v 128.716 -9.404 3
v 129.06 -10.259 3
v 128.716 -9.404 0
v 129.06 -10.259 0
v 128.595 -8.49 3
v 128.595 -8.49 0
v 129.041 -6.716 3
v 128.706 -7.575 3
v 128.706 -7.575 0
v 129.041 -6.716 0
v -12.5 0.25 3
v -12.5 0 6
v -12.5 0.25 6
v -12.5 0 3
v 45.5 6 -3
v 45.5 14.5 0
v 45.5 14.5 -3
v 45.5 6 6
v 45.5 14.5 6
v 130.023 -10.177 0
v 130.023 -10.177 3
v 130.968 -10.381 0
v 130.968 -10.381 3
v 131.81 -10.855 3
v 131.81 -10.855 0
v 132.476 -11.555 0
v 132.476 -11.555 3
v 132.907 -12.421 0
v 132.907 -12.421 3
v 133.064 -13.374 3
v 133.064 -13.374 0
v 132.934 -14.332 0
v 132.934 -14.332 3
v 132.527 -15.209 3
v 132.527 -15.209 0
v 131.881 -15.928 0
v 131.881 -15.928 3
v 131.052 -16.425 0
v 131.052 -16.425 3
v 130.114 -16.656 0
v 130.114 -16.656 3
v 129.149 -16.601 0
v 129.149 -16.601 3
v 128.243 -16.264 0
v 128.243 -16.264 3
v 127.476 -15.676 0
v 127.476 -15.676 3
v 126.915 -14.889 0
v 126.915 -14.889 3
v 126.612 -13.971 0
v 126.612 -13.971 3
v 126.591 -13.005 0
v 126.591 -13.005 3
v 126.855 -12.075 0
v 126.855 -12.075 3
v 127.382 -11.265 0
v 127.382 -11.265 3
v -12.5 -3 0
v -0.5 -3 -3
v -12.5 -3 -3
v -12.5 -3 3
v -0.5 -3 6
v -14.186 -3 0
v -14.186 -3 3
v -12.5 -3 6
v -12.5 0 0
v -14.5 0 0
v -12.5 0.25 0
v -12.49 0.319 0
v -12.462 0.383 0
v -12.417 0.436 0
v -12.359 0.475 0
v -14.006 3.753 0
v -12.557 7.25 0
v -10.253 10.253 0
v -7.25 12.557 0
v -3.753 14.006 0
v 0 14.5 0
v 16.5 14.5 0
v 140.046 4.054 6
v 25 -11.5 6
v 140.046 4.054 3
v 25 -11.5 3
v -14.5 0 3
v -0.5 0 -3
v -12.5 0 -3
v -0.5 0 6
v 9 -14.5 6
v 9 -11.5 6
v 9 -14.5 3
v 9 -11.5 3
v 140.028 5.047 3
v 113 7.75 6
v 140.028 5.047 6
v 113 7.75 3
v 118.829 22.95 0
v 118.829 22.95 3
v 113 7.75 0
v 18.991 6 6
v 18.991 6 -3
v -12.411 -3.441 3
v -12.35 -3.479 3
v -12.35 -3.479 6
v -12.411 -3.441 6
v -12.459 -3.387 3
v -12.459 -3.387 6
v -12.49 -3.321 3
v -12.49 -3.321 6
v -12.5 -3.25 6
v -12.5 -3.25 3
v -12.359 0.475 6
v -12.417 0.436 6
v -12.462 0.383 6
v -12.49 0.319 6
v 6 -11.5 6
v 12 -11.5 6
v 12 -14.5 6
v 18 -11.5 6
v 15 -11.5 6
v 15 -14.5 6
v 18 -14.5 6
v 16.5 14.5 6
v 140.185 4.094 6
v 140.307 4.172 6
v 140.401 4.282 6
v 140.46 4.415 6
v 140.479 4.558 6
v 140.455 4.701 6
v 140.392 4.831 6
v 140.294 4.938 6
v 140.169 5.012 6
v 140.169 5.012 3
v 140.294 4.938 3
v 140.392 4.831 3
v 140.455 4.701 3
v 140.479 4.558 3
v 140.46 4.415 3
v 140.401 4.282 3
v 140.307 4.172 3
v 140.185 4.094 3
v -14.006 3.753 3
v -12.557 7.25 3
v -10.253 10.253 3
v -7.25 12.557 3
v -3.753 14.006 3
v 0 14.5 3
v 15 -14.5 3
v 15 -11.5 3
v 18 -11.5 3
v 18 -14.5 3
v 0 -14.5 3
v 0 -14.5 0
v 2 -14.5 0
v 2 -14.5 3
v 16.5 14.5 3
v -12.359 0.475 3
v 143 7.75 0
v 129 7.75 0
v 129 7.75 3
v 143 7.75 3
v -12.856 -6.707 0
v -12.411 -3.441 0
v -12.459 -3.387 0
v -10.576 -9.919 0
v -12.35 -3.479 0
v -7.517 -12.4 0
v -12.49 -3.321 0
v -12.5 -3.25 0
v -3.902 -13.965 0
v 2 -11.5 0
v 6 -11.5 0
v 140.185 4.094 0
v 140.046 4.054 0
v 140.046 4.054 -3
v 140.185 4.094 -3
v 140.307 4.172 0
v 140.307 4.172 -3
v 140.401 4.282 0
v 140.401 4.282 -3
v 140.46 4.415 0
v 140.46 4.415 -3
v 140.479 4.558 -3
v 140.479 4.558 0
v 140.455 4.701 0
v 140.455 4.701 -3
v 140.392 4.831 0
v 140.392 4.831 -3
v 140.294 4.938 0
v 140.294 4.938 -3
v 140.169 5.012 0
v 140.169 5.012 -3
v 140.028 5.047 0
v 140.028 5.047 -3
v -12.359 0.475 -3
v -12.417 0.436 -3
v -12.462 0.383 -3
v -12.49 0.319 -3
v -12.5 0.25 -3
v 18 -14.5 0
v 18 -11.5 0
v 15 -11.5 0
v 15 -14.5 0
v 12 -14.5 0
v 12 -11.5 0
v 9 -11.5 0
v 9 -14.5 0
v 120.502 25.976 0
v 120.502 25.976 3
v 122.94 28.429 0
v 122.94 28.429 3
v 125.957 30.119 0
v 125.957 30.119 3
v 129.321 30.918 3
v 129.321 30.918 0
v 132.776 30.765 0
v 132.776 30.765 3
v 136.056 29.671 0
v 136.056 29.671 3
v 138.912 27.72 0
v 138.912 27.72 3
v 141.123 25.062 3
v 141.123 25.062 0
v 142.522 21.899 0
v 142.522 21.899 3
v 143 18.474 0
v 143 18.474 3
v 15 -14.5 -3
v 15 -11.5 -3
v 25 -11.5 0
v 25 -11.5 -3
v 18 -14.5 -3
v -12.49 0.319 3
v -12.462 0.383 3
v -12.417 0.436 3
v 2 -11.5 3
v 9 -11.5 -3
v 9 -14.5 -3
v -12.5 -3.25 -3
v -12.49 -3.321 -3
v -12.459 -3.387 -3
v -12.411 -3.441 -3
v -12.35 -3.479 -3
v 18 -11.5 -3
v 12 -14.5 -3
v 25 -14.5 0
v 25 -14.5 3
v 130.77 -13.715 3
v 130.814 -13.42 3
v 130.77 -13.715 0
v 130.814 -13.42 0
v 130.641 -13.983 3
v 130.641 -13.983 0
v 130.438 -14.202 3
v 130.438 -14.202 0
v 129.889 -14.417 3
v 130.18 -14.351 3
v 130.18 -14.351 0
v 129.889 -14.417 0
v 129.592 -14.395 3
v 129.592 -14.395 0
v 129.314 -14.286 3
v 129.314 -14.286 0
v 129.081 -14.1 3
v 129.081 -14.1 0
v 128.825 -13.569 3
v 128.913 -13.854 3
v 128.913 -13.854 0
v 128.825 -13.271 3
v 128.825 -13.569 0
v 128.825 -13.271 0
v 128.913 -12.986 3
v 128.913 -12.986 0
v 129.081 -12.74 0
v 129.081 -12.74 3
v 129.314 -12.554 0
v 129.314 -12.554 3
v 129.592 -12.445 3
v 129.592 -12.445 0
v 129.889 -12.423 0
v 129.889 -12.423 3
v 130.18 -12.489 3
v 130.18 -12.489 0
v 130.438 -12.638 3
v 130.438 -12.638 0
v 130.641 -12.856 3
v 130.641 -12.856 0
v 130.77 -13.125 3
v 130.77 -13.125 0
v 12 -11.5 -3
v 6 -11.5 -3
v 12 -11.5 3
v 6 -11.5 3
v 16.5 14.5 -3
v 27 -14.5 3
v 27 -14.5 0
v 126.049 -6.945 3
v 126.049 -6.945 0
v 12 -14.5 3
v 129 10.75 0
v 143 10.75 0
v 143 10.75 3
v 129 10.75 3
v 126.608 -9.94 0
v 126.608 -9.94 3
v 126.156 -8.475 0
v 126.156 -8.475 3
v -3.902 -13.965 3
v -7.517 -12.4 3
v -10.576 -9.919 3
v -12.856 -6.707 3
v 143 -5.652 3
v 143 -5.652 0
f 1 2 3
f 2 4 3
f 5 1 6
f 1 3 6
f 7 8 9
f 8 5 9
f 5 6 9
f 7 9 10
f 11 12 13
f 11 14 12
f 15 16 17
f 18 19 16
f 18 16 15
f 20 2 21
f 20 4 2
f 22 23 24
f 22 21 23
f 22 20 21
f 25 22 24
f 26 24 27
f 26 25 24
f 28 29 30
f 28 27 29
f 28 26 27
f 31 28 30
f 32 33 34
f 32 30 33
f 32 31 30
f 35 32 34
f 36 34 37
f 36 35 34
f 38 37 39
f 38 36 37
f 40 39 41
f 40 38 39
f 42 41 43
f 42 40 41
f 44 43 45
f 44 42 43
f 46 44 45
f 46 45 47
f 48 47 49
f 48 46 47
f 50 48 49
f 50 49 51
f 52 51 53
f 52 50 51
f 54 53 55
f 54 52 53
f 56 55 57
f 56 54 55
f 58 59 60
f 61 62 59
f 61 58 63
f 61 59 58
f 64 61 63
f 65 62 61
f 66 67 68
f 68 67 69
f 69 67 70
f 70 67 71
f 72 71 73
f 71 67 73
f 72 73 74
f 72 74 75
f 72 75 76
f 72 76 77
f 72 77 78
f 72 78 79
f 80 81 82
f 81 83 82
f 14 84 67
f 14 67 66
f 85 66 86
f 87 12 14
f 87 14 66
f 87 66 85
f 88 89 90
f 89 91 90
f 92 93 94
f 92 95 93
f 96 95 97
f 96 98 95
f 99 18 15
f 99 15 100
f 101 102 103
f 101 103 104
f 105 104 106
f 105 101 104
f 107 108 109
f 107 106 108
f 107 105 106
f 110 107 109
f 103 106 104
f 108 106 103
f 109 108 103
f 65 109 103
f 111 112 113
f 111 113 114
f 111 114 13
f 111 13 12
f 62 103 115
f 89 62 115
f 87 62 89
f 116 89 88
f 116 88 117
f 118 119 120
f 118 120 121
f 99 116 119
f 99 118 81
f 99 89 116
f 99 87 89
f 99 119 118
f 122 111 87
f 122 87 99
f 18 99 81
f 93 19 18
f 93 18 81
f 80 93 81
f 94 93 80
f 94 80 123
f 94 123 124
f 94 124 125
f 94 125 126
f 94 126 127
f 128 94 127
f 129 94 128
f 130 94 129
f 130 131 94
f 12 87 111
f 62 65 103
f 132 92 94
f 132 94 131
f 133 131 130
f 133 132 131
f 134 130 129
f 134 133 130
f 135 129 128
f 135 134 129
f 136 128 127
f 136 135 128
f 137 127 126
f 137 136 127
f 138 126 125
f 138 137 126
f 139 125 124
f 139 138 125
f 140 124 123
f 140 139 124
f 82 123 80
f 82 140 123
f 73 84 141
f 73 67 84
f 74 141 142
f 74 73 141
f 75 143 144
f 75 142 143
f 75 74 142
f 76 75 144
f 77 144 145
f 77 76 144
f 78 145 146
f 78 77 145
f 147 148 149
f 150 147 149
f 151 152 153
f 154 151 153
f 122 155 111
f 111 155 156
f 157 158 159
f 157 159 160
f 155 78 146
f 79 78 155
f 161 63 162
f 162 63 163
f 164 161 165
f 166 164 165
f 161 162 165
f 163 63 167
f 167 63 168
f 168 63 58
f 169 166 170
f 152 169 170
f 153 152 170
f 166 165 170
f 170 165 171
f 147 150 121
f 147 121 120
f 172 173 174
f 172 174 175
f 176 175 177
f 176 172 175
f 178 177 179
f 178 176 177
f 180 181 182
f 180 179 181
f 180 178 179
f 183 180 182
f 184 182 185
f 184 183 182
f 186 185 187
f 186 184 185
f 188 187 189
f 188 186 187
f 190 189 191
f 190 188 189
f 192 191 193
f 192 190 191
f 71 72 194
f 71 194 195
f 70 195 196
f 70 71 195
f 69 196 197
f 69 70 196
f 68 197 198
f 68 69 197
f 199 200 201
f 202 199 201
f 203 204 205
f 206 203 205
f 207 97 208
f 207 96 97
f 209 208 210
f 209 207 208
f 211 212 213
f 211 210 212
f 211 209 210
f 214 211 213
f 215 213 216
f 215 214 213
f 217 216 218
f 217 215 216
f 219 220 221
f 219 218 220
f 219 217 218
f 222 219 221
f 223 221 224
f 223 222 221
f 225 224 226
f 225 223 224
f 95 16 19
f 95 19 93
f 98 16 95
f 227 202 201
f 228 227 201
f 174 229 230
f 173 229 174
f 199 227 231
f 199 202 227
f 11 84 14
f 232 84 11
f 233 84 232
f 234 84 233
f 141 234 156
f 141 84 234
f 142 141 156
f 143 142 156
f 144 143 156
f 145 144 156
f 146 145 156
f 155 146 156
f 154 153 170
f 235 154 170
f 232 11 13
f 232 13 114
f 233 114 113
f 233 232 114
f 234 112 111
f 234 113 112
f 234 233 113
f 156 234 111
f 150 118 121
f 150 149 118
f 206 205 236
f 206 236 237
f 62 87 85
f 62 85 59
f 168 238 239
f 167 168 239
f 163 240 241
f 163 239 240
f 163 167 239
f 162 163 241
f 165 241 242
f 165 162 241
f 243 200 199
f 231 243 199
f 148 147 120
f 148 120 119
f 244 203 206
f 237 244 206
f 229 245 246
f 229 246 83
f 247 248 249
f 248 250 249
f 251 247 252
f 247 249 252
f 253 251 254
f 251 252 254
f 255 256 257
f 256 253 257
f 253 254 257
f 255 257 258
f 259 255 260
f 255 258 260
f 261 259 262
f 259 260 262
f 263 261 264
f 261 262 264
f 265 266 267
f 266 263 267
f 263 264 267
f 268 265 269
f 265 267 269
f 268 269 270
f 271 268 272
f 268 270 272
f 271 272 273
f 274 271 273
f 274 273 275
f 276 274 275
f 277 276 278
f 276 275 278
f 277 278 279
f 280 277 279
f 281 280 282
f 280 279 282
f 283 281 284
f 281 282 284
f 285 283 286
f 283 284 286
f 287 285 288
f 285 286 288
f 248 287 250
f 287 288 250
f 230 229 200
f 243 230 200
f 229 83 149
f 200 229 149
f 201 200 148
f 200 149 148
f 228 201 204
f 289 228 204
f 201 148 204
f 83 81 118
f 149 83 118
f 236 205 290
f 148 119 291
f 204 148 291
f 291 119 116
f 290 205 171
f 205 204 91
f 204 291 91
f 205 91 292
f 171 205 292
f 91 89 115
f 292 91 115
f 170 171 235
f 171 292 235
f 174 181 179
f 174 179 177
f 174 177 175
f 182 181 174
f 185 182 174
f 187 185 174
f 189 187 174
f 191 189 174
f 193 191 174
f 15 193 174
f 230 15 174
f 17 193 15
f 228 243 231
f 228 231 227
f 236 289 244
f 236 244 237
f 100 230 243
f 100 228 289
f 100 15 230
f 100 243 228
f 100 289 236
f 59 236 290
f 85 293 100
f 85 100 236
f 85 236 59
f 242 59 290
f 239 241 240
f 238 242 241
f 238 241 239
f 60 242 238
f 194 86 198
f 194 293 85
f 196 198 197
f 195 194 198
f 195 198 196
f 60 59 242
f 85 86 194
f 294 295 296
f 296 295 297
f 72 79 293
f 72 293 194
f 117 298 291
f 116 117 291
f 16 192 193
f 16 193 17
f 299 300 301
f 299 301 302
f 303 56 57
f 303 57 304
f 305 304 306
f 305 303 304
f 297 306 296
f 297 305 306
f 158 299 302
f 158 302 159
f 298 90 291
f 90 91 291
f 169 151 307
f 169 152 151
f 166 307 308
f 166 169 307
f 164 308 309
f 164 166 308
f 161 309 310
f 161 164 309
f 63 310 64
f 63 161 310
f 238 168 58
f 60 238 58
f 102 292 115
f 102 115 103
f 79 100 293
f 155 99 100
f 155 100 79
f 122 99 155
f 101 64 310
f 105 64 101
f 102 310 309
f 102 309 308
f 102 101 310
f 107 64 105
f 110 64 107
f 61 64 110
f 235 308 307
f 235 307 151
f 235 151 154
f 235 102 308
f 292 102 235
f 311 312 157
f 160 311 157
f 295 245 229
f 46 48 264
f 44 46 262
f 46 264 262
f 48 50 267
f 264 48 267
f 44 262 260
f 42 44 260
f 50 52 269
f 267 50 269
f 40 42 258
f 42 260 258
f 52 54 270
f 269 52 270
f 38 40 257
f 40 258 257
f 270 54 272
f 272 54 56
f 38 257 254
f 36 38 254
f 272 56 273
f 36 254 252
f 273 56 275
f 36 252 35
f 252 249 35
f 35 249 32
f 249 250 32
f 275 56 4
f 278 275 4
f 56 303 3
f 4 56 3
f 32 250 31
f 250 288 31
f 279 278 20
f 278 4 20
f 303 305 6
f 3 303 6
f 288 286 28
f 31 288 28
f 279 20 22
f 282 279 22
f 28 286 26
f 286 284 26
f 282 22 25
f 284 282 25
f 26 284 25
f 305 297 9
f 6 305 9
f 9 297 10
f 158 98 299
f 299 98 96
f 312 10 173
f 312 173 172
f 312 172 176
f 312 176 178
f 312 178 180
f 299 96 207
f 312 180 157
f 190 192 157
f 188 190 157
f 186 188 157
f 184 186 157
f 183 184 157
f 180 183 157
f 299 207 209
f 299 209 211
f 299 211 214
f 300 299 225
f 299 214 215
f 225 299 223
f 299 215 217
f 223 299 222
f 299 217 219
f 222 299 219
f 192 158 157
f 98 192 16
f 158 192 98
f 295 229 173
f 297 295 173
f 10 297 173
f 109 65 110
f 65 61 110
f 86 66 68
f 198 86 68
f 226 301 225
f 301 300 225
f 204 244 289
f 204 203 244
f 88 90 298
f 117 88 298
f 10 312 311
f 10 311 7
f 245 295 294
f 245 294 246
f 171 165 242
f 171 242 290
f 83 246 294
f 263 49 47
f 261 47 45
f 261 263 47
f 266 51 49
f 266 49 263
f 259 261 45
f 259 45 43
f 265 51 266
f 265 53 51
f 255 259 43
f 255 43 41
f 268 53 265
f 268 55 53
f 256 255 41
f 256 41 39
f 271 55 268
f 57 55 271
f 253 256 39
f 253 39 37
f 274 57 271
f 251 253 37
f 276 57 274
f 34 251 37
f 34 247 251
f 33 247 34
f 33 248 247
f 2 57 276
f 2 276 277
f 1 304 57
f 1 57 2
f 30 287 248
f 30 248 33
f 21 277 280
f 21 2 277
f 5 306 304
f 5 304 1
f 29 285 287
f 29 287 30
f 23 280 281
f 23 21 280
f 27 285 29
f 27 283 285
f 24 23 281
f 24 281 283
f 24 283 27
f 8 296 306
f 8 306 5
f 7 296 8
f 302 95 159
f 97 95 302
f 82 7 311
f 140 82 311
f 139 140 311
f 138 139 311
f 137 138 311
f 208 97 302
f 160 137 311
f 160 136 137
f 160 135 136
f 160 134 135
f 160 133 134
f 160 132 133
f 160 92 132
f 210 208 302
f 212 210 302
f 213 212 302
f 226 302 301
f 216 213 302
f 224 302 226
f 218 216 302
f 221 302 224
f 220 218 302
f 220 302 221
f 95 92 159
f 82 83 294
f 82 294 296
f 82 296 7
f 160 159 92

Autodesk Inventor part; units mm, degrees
ref_plane "YZ Plane" through (0, 0, 0) normal (1, 0, 0) x (0, 1, 0)
ref_plane "XZ Plane" through (0, 0, 0) normal (0, 1, 0) x (-1, 0, 0)
ref_plane "XY Plane" through (0, 0, 0) normal (0, 0, 1) x (1, 0, 0)
sketch "Esboço1" plane through (0, 0, 0) normal (0, 0, 1) x (1, 0, 0)
  line L0 (0, 0) -> (143, 0)
  line L1 (0, 14.5) -> (16.5, 14.5)
  line L2 (45.5, 14.5) -> (45.5, 6)
  line L3 (143, 0) -> (113, 0)
  line L4 (45.5, 14.5) -> (113, 7.75)
  arc A0 (143, 18.4741) -> (118.8287, 22.9497) centre (130.5, 18.4741) ccw
  line L5 (113, 7.75) -> (118.8287, 22.9497)
  line L6 (0, -14.5) -> (2, -14.5)
  line L7 (2, -14.5) -> (2, -11.5)
  line L8 (18.9914, 6) -> (45.5, 6)
  line L9 (16.5, 14.5) -> (18.9914, 6)
  line L10 (27, -14.5) -> (25, -14.5)
  line L11 (25, -14.5) -> (25, -11.5)
  line L12 (2, -11.5) -> (25, -11.5)
  line L13 (143, -5.6516) -> (129.0406, -6.7164)
  arc A1 (127.3817, -11.2647) -> (129.06, -10.2586) centre (129.8143, -13.4198) ccw
  circle A2 centre (129.8143, -13.4198) radius 1
  arc A3 (126.0492, -6.9446) -> (127.3817, -11.2647) centre (132.7451, -7.2449) ccw
  arc A4 (129.0406, -6.7164) -> (129.06, -10.2586) centre (132.2697, -8.4698) ccw
  line L14 (27, -14.5) -> (126.0492, -6.9446)
  line L15 (129.0406, -6.7164) -> (143, -5.6516)
  line L16 (-14.5, 0) -> (-0.5, 0)
  line L17 (-0.5, 0) -> (-0.5, -3)
  line L18 (-0.5, -3) -> (-14.1863, -3)
  arc A5 (0, 14.5) -> (-14.5, 0) centre (0, 0) ccw
  arc A6 (-14.1863, -3) -> (0, -14.5) centre (0, 0) ccw
  line L19 (113, 7.75) -> (124.9404, 6.556)
  line L20 (143, 10.75) -> (129, 10.75)
  line L21 (129, 10.75) -> (129, 7.75)
  line L22 (129, 7.75) -> (143, 7.75)
  line L23 (143, -5.6516) -> (143, 7.75)
  line L24 (143, 10.75) -> (143, 18.4741)
  dimension "d1" = 143
  dimension "d5" = 29
  dimension "d6" = 8.5
  dimension "d23" = 2
  dimension "d24" = 3
  dimension "d67" = 6.5
  dimension "d68" = 2
  dimension "d85" = 14
  dimension "d86" = 3
  dimension "d87" = 12
  dimension "d91" = 14
extrude "Extrusão1" add sketch "Esboço1" along normal blind 3
sketch "Esboço2" plane through (0, 0, 3) normal (0, 0, 1) x (1, 0, 0)
  line L0 (113, 7.75) -> (45.5, 14.5) projected
  line L1 (45.5, 14.5) -> (140.0285, 5.0471)
  arc A0 (140.0458, 4.0541) -> (140.0285, 5.0471) centre (139.9788, 4.5496) ccw
  line L2 (18.9914, 6) -> (16.5, 14.5) projected
  line L3 (25, -11.5) -> (140.0458, 4.0541)
  line L4 (45.5, 6) -> (18.9914, 6) projected
  line L5 (18.9914, 6) -> (45.5, 6)
  line L6 (45.5, 6) -> (45.5, 14.5)
  line L7 (9, -11.5) -> (9, -14.5)
  line L8 (9, -14.5) -> (12, -14.5)
  line L9 (12, -14.5) -> (12, -11.5)
  line L10 (6, -11.5) -> (9, -11.5)
  line L11 (18, -11.5) -> (18, -14.5)
  line L12 (18, -14.5) -> (15, -14.5)
  line L13 (15, -14.5) -> (15, -11.5)
  line L14 (12, -11.5) -> (15, -11.5)
  line L15 (18, -11.5) -> (25, -11.5)
  line L16 (-12.5, 0) -> (-12.5, 0.25)
  arc A1 (-12.3593, 0.4749) -> (-12.5, 0.25) centre (-12.25, 0.25) ccw
  line L17 (16.5, 14.5) -> (-12.3593, 0.4749)
  line L18 (-12.5, -3) -> (-12.5, -3.25)
  arc A2 (-12.5, -3.25) -> (-12.3501, -3.4791) centre (-12.25, -3.25) ccw
  line L19 (6, -11.5) -> (-12.3501, -3.4791)
  line L20 (-12.5, 0) -> (-0.5, 0)
  line L21 (-0.5, 0) -> (-0.5, -3)
  line L22 (-0.5, -3) -> (-12.5, -3)
  point P0 (0, 0)
  point P1 (113, 7.75)
  dimension "d22" = 95
  dimension "d45" = 3
  dimension "d46" = 3
  dimension "d48" = 3
  dimension "d49" = 3
  dimension "d60" = 3
  dimension "d82" = 12
extrude "Extrusão2" add sketch "Esboço2" along normal blind 3
sketch "Esboço3" plane through (0, 0, 0) normal (0, 0, -1) x (-1, 0, 0)
  arc A0 (-140.0285, 5.0471) -> (-140.0458, 4.0541) centre (-139.9788, 4.5496) ccw projected
  arc A1 (-140.0285, 5.0471) -> (-140.0458, 4.0541) centre (-139.9788, 4.5496) ccw
  line L0 (-25, -11.5) -> (-140.0458, 4.0541)
  line L1 (-45.5, 14.5) -> (-45.5, 6) projected
  line L2 (-45.5, 14.5) -> (-45.5, 6)
  line L3 (-45.5, 6) -> (-18.9914, 6)
  line L4 (-25, -11.5) -> (-18, -11.5)
  line L5 (-18.9914, 6) -> (-16.5, 14.5)
  arc A2 (12.5, 0.25) -> (12.3593, 0.4749) centre (12.25, 0.25) ccw projected
  arc A3 (12.5, 0.25) -> (12.3593, 0.4749) centre (12.25, 0.25) ccw
  arc A4 (12.3501, -3.4791) -> (12.5, -3.25) centre (12.25, -3.25) ccw projected
  arc A5 (12.3501, -3.4791) -> (12.5, -3.25) centre (12.25, -3.25) ccw
  line L6 (-15, -14.5) -> (-18, -14.5) projected
  line L7 (-18, -11.5) -> (-18, -14.5)
  line L8 (-18, -14.5) -> (-15, -14.5)
  line L9 (-15, -14.5) -> (-15, -11.5)
  line L10 (-12, -14.5) -> (-12, -11.5) projected
  line L11 (-15, -11.5) -> (-12, -11.5)
  line L12 (-12, -11.5) -> (-12, -14.5)
  line L13 (-9, -11.5) -> (-9, -14.5) projected
  line L14 (-12, -14.5) -> (-9, -14.5)
  line L15 (-9, -14.5) -> (-9, -11.5)
  line L16 (12.3501, -3.4791) -> (-6, -11.5) projected
  line L17 (-9, -11.5) -> (-6, -11.5)
  line L18 (-6, -11.5) -> (12.3501, -3.4791)
  line L19 (-16.5, 14.5) -> (12.3593, 0.4749) projected
  line L20 (-16.5, 14.5) -> (12.3593, 0.4749)
  line L21 (-140.0285, 5.0471) -> (-45.5, 14.5) projected
  line L22 (-45.5, 14.5) -> (-140.0285, 5.0471)
  line L23 (12.5, -3.25) -> (12.5, -3)
  line L24 (12.5, 0) -> (12.5, 0.25)
  line L25 (12.5, 0) -> (0.5, 0)
  line L26 (0.5, 0) -> (0.5, -3)
  line L27 (0.5, -3) -> (12.5, -3)
  point P0 (12.3501, -3.4791)
  point P1 (12.3593, 0.4749)
  point P2 (12.3593, 0.4749)
  point P3 (12.5, 0.25)
  point P4 (12.5, -3.25)
  point P5 (12.3501, -3.4791)
extrude "Extrusão3" add sketch "Esboço3" along normal blind 3
properties part number "CORPO"
